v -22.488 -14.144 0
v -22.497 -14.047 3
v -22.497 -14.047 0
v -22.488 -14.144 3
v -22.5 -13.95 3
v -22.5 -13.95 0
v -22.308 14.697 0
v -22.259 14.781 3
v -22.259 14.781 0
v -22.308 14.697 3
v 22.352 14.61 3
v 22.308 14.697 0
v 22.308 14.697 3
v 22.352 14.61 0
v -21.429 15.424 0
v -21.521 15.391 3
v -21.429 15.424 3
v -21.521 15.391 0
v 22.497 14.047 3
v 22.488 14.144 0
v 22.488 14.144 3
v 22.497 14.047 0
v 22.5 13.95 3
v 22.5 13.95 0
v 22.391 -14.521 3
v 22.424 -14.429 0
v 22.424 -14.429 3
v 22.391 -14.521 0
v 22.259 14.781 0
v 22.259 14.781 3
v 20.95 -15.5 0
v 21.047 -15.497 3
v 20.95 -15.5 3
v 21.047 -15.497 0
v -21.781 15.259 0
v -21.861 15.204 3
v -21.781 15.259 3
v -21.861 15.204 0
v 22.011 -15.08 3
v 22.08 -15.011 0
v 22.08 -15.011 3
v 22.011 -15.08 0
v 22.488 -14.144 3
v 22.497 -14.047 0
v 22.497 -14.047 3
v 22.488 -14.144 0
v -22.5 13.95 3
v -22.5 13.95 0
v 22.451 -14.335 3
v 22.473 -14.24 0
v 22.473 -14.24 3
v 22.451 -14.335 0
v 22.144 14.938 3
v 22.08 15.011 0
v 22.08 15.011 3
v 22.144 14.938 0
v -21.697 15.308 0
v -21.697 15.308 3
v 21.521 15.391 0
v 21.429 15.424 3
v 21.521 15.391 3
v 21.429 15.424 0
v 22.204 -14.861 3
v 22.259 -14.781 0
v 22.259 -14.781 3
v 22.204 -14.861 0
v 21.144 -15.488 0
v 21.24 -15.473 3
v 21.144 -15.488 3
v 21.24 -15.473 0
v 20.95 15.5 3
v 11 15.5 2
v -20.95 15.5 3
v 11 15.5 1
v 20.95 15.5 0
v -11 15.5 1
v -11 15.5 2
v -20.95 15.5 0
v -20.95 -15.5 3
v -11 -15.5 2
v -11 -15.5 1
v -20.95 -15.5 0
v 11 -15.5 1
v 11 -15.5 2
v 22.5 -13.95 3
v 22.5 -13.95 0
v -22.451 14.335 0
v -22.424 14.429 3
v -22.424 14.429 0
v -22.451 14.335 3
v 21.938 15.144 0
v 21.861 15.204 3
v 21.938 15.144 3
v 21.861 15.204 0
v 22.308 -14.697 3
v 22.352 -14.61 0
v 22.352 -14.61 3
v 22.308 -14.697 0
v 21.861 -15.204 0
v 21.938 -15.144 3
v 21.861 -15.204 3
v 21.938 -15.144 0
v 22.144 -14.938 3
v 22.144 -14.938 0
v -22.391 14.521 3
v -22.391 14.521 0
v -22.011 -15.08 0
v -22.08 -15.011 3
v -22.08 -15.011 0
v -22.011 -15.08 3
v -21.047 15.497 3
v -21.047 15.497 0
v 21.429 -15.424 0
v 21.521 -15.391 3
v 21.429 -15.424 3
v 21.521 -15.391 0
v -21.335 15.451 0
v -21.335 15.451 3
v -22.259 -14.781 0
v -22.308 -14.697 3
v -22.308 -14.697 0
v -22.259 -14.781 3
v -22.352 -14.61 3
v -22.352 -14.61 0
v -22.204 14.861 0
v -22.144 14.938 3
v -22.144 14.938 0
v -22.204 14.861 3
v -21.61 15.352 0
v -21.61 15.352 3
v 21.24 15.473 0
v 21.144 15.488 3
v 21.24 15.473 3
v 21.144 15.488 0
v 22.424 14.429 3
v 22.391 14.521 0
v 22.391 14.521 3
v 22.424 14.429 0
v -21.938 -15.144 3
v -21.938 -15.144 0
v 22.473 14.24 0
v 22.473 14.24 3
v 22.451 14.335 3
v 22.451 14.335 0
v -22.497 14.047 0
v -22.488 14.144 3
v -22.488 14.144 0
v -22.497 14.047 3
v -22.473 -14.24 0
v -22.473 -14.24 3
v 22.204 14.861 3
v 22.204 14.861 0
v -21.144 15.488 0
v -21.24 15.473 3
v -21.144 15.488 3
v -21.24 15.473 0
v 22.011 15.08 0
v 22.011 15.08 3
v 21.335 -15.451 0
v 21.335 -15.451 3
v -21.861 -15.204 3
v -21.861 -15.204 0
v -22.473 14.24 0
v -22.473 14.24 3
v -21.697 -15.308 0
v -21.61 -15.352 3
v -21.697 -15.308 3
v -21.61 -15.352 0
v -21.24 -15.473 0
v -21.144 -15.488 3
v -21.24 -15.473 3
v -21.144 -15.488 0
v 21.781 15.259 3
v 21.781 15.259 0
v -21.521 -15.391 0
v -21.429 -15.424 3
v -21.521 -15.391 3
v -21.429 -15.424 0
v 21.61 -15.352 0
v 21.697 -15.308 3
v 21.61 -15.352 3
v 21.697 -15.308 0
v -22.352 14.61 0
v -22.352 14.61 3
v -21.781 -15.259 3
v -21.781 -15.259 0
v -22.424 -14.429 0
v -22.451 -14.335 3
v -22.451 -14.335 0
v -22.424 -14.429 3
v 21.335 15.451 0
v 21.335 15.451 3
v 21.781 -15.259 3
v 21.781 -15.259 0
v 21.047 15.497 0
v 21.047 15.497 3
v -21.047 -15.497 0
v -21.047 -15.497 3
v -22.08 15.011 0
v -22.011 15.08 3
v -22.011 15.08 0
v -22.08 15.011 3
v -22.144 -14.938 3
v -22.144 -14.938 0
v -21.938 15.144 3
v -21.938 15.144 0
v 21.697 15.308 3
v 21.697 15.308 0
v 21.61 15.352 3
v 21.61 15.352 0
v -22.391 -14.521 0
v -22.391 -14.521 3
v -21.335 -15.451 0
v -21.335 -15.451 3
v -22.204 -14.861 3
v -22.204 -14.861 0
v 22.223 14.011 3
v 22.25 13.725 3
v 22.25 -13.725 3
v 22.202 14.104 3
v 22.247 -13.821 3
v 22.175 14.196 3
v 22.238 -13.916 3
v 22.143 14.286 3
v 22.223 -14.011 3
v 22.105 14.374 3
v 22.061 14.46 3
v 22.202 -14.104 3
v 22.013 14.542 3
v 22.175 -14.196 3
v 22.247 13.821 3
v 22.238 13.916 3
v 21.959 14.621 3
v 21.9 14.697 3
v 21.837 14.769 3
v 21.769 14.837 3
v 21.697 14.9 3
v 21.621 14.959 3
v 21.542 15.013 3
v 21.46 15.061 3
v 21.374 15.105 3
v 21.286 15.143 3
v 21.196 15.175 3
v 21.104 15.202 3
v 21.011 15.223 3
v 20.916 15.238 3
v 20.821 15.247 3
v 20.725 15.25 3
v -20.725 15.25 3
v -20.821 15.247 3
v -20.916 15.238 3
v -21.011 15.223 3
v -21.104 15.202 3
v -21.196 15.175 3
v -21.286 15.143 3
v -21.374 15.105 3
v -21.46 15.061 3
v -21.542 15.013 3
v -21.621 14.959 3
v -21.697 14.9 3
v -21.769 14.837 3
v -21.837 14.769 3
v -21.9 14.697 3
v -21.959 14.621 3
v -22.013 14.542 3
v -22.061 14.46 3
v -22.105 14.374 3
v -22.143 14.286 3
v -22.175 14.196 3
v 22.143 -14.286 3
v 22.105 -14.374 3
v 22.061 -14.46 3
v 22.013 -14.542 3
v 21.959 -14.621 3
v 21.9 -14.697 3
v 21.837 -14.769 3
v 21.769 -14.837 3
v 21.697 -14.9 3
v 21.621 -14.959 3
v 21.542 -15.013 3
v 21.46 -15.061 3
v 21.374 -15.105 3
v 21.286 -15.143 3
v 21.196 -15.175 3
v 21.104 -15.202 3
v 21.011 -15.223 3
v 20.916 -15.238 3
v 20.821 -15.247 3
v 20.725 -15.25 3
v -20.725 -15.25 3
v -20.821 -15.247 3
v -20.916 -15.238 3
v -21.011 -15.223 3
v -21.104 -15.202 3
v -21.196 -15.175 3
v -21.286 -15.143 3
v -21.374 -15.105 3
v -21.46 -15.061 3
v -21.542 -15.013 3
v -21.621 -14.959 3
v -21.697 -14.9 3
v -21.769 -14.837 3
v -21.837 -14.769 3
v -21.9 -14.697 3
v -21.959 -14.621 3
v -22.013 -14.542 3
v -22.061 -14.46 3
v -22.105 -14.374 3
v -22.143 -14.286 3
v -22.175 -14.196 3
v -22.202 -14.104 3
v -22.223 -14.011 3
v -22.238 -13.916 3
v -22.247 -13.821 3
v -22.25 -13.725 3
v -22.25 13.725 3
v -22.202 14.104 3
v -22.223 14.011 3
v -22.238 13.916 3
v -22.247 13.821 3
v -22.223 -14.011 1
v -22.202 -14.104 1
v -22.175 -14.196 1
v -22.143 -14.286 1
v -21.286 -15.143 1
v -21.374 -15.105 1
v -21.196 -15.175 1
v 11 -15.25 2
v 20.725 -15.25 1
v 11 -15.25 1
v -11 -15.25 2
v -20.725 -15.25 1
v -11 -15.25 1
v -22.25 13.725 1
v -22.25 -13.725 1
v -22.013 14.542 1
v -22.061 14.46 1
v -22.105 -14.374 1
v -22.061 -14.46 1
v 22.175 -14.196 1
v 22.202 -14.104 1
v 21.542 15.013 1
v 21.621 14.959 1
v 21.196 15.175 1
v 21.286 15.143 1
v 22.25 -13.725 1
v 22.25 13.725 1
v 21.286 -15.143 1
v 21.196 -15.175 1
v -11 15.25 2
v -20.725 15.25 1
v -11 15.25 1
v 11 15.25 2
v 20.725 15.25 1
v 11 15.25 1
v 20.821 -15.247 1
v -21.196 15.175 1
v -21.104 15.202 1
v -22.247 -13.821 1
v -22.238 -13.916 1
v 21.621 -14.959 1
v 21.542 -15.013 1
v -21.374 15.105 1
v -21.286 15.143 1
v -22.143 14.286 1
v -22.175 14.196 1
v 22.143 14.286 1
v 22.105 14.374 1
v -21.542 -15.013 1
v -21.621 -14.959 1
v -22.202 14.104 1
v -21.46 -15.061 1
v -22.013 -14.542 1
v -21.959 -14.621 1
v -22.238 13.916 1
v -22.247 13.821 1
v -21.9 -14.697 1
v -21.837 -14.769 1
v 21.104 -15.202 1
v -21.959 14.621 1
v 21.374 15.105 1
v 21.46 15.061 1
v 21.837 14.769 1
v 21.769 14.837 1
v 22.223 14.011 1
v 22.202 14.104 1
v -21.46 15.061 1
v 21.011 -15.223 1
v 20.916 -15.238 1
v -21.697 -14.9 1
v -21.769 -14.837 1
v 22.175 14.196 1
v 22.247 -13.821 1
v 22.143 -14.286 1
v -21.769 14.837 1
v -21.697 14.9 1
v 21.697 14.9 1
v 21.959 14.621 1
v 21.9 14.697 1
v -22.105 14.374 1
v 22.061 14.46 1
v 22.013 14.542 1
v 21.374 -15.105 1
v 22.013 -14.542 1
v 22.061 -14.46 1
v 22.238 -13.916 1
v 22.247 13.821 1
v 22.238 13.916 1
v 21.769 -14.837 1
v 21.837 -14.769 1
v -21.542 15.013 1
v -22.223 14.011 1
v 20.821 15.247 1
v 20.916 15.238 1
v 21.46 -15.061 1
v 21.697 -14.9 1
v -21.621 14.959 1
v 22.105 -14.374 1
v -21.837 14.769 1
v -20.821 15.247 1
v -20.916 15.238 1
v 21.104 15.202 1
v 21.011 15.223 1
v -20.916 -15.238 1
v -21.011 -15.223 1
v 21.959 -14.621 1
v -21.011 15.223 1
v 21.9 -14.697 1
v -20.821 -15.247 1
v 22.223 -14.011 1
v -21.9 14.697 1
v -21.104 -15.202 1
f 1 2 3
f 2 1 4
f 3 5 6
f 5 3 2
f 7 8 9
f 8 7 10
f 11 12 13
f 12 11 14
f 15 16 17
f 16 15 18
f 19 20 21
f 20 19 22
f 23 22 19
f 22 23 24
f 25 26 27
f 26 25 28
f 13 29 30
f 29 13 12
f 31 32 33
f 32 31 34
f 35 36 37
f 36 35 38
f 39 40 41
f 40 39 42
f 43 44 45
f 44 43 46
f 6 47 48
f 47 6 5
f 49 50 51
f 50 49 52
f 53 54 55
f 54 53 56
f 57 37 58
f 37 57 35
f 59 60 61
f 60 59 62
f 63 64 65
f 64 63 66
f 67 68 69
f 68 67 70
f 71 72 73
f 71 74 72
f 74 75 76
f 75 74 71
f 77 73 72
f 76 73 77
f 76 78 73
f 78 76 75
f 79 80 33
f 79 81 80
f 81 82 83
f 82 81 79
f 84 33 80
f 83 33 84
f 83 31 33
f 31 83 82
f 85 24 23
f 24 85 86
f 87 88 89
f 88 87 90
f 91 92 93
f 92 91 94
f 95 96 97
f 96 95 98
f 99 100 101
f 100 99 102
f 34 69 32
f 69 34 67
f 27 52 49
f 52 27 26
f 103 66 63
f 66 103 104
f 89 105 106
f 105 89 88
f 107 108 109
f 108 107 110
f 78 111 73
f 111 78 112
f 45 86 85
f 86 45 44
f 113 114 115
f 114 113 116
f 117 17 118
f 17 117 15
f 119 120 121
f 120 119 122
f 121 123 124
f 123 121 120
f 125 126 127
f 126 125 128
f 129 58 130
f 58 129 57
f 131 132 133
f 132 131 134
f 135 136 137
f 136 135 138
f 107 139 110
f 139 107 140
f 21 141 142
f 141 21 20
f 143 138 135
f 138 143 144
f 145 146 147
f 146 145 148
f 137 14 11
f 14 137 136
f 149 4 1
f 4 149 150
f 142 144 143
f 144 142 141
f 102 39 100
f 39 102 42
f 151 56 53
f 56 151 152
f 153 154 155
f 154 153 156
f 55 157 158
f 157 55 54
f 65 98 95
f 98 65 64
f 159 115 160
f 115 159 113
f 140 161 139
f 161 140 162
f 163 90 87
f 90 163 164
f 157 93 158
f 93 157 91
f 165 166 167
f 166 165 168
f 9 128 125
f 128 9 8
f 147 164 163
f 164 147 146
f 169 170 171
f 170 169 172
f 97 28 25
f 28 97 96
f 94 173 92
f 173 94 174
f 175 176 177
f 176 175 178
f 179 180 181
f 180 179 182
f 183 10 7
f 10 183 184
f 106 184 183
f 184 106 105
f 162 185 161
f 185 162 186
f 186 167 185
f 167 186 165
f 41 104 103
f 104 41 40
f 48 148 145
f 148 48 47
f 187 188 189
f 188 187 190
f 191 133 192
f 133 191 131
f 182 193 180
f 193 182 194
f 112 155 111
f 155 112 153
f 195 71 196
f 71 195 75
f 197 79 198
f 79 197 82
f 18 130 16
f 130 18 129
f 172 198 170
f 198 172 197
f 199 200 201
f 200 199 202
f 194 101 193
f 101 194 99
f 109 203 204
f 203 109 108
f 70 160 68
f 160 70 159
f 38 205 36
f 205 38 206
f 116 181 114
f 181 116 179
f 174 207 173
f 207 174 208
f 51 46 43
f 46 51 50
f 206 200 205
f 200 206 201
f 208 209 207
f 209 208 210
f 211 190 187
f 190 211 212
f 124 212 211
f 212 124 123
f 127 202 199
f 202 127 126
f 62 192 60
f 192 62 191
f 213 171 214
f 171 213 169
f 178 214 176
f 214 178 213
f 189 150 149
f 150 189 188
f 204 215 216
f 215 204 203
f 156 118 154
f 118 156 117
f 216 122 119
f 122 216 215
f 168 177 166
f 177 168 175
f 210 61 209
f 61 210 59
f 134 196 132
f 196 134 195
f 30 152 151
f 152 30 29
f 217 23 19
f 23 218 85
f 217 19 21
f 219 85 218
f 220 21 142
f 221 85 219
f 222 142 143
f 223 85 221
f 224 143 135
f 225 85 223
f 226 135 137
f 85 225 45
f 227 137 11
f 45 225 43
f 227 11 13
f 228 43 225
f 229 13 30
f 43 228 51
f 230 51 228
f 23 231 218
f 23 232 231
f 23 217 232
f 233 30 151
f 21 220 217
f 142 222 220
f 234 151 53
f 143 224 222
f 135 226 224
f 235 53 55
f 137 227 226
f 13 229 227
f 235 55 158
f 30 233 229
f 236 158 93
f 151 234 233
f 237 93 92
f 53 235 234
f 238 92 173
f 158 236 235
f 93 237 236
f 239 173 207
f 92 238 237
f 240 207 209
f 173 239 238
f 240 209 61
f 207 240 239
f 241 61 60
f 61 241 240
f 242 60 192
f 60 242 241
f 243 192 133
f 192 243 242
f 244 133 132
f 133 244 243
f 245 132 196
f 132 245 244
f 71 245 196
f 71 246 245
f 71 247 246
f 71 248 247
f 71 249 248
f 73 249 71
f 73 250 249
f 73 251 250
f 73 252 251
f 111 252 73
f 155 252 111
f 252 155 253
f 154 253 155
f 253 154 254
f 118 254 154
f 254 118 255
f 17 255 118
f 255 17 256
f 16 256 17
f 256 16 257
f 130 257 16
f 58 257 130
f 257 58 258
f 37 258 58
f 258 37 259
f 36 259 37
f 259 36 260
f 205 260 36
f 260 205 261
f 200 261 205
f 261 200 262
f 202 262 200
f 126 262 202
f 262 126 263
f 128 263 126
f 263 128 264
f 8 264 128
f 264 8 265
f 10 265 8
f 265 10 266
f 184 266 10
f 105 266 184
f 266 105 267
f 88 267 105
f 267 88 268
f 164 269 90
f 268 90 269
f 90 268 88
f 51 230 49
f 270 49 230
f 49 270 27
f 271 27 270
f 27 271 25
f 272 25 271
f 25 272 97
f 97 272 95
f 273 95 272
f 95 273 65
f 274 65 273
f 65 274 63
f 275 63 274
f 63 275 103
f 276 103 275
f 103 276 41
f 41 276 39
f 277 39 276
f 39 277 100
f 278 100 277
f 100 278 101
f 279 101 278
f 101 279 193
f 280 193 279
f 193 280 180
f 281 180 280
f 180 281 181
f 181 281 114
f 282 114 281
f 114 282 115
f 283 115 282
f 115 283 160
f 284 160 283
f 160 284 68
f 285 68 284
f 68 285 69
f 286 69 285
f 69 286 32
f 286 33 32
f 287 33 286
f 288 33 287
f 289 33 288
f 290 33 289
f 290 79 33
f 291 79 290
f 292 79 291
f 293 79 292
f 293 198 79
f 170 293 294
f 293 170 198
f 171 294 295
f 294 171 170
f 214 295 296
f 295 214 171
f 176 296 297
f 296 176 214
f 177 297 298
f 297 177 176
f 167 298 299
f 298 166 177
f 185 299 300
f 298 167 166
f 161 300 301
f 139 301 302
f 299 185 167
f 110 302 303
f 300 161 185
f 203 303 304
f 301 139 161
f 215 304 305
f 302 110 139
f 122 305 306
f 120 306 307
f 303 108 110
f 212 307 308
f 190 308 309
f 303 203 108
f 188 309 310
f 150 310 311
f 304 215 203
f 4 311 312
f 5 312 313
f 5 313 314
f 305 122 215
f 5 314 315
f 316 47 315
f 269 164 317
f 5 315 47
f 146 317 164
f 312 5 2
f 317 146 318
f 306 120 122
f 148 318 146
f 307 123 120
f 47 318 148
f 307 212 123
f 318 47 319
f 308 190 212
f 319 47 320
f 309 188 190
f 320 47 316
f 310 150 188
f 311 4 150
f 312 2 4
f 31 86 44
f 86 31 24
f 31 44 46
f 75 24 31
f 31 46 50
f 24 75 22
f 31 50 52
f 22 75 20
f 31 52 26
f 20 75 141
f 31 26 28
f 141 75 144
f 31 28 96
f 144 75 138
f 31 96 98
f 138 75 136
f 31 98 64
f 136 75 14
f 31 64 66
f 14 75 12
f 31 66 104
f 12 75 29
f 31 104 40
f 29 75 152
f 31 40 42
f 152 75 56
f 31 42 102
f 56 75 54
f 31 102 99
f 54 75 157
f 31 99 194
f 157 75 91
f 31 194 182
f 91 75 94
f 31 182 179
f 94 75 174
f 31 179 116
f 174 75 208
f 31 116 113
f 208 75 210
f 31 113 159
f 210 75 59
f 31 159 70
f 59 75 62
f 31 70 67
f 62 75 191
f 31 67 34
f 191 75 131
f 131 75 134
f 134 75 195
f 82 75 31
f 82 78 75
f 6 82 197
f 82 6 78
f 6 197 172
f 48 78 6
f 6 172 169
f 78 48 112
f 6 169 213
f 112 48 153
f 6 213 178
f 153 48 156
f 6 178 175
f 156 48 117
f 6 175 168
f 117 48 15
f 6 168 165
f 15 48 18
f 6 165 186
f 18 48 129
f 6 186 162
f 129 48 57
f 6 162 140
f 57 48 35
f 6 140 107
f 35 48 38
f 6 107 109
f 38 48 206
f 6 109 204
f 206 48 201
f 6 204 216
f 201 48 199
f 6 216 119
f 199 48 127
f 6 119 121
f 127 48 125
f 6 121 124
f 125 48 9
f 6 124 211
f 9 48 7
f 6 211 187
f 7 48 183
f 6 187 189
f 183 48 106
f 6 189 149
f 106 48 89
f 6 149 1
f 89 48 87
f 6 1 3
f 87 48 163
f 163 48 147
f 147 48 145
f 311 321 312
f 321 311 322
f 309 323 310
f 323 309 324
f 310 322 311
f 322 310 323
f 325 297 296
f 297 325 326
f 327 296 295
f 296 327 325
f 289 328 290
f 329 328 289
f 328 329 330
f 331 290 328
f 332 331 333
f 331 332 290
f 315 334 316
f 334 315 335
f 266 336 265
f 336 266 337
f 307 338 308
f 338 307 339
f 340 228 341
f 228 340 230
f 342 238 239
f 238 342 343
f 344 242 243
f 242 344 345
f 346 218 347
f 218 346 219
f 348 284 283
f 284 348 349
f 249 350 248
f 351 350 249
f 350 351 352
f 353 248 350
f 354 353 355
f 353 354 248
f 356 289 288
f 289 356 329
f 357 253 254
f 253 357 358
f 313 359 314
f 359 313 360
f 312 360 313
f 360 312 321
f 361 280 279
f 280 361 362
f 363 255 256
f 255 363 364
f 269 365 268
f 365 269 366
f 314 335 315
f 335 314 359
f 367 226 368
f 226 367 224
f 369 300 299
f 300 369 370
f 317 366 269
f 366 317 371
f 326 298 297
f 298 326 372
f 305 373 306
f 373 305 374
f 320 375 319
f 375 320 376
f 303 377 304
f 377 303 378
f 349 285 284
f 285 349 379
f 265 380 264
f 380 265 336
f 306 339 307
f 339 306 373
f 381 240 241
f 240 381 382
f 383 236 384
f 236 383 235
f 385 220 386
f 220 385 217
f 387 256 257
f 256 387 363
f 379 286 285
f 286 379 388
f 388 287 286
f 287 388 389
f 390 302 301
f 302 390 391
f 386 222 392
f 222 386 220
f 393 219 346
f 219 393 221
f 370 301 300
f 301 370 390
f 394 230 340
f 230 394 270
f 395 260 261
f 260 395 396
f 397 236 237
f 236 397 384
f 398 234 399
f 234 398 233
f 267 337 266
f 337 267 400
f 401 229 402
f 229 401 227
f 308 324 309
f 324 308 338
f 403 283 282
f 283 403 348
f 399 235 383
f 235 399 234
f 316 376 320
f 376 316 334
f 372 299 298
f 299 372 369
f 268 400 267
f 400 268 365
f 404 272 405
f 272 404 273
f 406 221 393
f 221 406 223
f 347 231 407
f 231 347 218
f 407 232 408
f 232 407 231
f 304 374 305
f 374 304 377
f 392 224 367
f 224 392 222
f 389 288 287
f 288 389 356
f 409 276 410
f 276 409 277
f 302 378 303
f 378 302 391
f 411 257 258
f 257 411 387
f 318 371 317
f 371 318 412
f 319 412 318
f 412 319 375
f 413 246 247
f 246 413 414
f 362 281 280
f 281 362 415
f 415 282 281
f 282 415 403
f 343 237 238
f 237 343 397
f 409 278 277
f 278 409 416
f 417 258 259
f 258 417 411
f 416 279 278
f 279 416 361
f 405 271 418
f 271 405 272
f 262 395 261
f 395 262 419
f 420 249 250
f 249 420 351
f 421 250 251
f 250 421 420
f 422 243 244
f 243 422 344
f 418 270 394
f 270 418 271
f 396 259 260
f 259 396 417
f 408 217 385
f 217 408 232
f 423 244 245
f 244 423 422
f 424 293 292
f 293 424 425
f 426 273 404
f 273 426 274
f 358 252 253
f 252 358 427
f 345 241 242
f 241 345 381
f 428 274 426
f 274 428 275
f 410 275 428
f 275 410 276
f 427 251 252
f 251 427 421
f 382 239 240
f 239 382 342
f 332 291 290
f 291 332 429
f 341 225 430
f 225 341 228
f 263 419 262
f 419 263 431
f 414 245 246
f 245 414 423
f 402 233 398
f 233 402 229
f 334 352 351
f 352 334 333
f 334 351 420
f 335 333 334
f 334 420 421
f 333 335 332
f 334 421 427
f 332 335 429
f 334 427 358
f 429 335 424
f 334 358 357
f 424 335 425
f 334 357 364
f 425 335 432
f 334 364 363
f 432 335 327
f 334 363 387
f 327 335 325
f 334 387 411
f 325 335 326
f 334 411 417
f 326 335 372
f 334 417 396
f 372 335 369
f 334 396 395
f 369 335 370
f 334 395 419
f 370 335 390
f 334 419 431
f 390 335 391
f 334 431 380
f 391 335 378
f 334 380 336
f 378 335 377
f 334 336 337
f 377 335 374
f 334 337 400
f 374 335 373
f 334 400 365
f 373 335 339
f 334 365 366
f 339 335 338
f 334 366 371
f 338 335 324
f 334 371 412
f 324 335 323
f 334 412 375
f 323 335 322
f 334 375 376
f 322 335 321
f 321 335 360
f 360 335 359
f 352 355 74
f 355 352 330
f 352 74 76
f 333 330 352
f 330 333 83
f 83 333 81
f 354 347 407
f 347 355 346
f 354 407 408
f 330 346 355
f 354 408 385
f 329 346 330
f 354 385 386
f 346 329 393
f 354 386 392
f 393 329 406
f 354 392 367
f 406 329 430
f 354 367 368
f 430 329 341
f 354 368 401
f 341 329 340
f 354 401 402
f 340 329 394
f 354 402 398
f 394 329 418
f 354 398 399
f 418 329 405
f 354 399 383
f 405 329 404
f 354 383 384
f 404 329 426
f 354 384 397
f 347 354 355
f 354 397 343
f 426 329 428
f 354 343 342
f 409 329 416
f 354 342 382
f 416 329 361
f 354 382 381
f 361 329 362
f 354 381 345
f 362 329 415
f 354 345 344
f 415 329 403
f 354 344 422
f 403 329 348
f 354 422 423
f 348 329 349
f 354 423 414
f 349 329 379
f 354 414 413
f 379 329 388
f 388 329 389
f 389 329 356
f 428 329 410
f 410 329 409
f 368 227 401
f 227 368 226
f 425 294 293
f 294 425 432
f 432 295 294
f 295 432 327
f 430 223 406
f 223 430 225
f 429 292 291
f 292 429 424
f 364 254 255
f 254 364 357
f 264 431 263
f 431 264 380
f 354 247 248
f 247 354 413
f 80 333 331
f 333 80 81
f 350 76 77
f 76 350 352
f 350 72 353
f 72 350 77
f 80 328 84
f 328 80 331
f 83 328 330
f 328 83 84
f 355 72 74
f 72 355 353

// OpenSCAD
// file: unwatch_parameters.scad
board_w = 47;
board_h = 33;
board_thickness = 2;

outer_lip = 0.5;
inner_lip = 2;

case_thickness = 8;

band_w = 22;
band_h = 1;

module lug_slot() {
    h = board_h+outer_lip*2;
    translate([0, 0, band_h/2])
    rotate([90, 0, 0]) 
    translate([0, 0, -h/2]) 
    rotate([0, 0, 90])
    linear_extrude(board_h+outer_lip*2) 
        square([band_h, band_w], true);
}
// file: rounded_rectangle.scad
module rounded_rectangle(w, h) {
    r = min(w, h) * 0.05;
    $fn = 100;
    
    hull() {
        for (x = [-w/2+r, w/2-r]) {
            for (y = [-h/2+r, h/2-r]) {
                translate([x, y, 0]) circle(r);
            }
        }
    }
}
// main file
include <rounded_rectangle.scad>;
include <unwatch_parameters.scad>;

back_w = board_w-inner_lip;
back_d = board_h-inner_lip;
back_h = 3;
back_thickness = 1;

difference() {
    linear_extrude(back_h)
        rounded_rectangle(back_w, back_d);
    
    translate([0, 0, back_thickness])
    linear_extrude(back_h - back_thickness)
         rounded_rectangle(back_w-outer_lip, back_d-outer_lip);
    
    translate([0, 0, back_thickness])
        lug_slot();
}
